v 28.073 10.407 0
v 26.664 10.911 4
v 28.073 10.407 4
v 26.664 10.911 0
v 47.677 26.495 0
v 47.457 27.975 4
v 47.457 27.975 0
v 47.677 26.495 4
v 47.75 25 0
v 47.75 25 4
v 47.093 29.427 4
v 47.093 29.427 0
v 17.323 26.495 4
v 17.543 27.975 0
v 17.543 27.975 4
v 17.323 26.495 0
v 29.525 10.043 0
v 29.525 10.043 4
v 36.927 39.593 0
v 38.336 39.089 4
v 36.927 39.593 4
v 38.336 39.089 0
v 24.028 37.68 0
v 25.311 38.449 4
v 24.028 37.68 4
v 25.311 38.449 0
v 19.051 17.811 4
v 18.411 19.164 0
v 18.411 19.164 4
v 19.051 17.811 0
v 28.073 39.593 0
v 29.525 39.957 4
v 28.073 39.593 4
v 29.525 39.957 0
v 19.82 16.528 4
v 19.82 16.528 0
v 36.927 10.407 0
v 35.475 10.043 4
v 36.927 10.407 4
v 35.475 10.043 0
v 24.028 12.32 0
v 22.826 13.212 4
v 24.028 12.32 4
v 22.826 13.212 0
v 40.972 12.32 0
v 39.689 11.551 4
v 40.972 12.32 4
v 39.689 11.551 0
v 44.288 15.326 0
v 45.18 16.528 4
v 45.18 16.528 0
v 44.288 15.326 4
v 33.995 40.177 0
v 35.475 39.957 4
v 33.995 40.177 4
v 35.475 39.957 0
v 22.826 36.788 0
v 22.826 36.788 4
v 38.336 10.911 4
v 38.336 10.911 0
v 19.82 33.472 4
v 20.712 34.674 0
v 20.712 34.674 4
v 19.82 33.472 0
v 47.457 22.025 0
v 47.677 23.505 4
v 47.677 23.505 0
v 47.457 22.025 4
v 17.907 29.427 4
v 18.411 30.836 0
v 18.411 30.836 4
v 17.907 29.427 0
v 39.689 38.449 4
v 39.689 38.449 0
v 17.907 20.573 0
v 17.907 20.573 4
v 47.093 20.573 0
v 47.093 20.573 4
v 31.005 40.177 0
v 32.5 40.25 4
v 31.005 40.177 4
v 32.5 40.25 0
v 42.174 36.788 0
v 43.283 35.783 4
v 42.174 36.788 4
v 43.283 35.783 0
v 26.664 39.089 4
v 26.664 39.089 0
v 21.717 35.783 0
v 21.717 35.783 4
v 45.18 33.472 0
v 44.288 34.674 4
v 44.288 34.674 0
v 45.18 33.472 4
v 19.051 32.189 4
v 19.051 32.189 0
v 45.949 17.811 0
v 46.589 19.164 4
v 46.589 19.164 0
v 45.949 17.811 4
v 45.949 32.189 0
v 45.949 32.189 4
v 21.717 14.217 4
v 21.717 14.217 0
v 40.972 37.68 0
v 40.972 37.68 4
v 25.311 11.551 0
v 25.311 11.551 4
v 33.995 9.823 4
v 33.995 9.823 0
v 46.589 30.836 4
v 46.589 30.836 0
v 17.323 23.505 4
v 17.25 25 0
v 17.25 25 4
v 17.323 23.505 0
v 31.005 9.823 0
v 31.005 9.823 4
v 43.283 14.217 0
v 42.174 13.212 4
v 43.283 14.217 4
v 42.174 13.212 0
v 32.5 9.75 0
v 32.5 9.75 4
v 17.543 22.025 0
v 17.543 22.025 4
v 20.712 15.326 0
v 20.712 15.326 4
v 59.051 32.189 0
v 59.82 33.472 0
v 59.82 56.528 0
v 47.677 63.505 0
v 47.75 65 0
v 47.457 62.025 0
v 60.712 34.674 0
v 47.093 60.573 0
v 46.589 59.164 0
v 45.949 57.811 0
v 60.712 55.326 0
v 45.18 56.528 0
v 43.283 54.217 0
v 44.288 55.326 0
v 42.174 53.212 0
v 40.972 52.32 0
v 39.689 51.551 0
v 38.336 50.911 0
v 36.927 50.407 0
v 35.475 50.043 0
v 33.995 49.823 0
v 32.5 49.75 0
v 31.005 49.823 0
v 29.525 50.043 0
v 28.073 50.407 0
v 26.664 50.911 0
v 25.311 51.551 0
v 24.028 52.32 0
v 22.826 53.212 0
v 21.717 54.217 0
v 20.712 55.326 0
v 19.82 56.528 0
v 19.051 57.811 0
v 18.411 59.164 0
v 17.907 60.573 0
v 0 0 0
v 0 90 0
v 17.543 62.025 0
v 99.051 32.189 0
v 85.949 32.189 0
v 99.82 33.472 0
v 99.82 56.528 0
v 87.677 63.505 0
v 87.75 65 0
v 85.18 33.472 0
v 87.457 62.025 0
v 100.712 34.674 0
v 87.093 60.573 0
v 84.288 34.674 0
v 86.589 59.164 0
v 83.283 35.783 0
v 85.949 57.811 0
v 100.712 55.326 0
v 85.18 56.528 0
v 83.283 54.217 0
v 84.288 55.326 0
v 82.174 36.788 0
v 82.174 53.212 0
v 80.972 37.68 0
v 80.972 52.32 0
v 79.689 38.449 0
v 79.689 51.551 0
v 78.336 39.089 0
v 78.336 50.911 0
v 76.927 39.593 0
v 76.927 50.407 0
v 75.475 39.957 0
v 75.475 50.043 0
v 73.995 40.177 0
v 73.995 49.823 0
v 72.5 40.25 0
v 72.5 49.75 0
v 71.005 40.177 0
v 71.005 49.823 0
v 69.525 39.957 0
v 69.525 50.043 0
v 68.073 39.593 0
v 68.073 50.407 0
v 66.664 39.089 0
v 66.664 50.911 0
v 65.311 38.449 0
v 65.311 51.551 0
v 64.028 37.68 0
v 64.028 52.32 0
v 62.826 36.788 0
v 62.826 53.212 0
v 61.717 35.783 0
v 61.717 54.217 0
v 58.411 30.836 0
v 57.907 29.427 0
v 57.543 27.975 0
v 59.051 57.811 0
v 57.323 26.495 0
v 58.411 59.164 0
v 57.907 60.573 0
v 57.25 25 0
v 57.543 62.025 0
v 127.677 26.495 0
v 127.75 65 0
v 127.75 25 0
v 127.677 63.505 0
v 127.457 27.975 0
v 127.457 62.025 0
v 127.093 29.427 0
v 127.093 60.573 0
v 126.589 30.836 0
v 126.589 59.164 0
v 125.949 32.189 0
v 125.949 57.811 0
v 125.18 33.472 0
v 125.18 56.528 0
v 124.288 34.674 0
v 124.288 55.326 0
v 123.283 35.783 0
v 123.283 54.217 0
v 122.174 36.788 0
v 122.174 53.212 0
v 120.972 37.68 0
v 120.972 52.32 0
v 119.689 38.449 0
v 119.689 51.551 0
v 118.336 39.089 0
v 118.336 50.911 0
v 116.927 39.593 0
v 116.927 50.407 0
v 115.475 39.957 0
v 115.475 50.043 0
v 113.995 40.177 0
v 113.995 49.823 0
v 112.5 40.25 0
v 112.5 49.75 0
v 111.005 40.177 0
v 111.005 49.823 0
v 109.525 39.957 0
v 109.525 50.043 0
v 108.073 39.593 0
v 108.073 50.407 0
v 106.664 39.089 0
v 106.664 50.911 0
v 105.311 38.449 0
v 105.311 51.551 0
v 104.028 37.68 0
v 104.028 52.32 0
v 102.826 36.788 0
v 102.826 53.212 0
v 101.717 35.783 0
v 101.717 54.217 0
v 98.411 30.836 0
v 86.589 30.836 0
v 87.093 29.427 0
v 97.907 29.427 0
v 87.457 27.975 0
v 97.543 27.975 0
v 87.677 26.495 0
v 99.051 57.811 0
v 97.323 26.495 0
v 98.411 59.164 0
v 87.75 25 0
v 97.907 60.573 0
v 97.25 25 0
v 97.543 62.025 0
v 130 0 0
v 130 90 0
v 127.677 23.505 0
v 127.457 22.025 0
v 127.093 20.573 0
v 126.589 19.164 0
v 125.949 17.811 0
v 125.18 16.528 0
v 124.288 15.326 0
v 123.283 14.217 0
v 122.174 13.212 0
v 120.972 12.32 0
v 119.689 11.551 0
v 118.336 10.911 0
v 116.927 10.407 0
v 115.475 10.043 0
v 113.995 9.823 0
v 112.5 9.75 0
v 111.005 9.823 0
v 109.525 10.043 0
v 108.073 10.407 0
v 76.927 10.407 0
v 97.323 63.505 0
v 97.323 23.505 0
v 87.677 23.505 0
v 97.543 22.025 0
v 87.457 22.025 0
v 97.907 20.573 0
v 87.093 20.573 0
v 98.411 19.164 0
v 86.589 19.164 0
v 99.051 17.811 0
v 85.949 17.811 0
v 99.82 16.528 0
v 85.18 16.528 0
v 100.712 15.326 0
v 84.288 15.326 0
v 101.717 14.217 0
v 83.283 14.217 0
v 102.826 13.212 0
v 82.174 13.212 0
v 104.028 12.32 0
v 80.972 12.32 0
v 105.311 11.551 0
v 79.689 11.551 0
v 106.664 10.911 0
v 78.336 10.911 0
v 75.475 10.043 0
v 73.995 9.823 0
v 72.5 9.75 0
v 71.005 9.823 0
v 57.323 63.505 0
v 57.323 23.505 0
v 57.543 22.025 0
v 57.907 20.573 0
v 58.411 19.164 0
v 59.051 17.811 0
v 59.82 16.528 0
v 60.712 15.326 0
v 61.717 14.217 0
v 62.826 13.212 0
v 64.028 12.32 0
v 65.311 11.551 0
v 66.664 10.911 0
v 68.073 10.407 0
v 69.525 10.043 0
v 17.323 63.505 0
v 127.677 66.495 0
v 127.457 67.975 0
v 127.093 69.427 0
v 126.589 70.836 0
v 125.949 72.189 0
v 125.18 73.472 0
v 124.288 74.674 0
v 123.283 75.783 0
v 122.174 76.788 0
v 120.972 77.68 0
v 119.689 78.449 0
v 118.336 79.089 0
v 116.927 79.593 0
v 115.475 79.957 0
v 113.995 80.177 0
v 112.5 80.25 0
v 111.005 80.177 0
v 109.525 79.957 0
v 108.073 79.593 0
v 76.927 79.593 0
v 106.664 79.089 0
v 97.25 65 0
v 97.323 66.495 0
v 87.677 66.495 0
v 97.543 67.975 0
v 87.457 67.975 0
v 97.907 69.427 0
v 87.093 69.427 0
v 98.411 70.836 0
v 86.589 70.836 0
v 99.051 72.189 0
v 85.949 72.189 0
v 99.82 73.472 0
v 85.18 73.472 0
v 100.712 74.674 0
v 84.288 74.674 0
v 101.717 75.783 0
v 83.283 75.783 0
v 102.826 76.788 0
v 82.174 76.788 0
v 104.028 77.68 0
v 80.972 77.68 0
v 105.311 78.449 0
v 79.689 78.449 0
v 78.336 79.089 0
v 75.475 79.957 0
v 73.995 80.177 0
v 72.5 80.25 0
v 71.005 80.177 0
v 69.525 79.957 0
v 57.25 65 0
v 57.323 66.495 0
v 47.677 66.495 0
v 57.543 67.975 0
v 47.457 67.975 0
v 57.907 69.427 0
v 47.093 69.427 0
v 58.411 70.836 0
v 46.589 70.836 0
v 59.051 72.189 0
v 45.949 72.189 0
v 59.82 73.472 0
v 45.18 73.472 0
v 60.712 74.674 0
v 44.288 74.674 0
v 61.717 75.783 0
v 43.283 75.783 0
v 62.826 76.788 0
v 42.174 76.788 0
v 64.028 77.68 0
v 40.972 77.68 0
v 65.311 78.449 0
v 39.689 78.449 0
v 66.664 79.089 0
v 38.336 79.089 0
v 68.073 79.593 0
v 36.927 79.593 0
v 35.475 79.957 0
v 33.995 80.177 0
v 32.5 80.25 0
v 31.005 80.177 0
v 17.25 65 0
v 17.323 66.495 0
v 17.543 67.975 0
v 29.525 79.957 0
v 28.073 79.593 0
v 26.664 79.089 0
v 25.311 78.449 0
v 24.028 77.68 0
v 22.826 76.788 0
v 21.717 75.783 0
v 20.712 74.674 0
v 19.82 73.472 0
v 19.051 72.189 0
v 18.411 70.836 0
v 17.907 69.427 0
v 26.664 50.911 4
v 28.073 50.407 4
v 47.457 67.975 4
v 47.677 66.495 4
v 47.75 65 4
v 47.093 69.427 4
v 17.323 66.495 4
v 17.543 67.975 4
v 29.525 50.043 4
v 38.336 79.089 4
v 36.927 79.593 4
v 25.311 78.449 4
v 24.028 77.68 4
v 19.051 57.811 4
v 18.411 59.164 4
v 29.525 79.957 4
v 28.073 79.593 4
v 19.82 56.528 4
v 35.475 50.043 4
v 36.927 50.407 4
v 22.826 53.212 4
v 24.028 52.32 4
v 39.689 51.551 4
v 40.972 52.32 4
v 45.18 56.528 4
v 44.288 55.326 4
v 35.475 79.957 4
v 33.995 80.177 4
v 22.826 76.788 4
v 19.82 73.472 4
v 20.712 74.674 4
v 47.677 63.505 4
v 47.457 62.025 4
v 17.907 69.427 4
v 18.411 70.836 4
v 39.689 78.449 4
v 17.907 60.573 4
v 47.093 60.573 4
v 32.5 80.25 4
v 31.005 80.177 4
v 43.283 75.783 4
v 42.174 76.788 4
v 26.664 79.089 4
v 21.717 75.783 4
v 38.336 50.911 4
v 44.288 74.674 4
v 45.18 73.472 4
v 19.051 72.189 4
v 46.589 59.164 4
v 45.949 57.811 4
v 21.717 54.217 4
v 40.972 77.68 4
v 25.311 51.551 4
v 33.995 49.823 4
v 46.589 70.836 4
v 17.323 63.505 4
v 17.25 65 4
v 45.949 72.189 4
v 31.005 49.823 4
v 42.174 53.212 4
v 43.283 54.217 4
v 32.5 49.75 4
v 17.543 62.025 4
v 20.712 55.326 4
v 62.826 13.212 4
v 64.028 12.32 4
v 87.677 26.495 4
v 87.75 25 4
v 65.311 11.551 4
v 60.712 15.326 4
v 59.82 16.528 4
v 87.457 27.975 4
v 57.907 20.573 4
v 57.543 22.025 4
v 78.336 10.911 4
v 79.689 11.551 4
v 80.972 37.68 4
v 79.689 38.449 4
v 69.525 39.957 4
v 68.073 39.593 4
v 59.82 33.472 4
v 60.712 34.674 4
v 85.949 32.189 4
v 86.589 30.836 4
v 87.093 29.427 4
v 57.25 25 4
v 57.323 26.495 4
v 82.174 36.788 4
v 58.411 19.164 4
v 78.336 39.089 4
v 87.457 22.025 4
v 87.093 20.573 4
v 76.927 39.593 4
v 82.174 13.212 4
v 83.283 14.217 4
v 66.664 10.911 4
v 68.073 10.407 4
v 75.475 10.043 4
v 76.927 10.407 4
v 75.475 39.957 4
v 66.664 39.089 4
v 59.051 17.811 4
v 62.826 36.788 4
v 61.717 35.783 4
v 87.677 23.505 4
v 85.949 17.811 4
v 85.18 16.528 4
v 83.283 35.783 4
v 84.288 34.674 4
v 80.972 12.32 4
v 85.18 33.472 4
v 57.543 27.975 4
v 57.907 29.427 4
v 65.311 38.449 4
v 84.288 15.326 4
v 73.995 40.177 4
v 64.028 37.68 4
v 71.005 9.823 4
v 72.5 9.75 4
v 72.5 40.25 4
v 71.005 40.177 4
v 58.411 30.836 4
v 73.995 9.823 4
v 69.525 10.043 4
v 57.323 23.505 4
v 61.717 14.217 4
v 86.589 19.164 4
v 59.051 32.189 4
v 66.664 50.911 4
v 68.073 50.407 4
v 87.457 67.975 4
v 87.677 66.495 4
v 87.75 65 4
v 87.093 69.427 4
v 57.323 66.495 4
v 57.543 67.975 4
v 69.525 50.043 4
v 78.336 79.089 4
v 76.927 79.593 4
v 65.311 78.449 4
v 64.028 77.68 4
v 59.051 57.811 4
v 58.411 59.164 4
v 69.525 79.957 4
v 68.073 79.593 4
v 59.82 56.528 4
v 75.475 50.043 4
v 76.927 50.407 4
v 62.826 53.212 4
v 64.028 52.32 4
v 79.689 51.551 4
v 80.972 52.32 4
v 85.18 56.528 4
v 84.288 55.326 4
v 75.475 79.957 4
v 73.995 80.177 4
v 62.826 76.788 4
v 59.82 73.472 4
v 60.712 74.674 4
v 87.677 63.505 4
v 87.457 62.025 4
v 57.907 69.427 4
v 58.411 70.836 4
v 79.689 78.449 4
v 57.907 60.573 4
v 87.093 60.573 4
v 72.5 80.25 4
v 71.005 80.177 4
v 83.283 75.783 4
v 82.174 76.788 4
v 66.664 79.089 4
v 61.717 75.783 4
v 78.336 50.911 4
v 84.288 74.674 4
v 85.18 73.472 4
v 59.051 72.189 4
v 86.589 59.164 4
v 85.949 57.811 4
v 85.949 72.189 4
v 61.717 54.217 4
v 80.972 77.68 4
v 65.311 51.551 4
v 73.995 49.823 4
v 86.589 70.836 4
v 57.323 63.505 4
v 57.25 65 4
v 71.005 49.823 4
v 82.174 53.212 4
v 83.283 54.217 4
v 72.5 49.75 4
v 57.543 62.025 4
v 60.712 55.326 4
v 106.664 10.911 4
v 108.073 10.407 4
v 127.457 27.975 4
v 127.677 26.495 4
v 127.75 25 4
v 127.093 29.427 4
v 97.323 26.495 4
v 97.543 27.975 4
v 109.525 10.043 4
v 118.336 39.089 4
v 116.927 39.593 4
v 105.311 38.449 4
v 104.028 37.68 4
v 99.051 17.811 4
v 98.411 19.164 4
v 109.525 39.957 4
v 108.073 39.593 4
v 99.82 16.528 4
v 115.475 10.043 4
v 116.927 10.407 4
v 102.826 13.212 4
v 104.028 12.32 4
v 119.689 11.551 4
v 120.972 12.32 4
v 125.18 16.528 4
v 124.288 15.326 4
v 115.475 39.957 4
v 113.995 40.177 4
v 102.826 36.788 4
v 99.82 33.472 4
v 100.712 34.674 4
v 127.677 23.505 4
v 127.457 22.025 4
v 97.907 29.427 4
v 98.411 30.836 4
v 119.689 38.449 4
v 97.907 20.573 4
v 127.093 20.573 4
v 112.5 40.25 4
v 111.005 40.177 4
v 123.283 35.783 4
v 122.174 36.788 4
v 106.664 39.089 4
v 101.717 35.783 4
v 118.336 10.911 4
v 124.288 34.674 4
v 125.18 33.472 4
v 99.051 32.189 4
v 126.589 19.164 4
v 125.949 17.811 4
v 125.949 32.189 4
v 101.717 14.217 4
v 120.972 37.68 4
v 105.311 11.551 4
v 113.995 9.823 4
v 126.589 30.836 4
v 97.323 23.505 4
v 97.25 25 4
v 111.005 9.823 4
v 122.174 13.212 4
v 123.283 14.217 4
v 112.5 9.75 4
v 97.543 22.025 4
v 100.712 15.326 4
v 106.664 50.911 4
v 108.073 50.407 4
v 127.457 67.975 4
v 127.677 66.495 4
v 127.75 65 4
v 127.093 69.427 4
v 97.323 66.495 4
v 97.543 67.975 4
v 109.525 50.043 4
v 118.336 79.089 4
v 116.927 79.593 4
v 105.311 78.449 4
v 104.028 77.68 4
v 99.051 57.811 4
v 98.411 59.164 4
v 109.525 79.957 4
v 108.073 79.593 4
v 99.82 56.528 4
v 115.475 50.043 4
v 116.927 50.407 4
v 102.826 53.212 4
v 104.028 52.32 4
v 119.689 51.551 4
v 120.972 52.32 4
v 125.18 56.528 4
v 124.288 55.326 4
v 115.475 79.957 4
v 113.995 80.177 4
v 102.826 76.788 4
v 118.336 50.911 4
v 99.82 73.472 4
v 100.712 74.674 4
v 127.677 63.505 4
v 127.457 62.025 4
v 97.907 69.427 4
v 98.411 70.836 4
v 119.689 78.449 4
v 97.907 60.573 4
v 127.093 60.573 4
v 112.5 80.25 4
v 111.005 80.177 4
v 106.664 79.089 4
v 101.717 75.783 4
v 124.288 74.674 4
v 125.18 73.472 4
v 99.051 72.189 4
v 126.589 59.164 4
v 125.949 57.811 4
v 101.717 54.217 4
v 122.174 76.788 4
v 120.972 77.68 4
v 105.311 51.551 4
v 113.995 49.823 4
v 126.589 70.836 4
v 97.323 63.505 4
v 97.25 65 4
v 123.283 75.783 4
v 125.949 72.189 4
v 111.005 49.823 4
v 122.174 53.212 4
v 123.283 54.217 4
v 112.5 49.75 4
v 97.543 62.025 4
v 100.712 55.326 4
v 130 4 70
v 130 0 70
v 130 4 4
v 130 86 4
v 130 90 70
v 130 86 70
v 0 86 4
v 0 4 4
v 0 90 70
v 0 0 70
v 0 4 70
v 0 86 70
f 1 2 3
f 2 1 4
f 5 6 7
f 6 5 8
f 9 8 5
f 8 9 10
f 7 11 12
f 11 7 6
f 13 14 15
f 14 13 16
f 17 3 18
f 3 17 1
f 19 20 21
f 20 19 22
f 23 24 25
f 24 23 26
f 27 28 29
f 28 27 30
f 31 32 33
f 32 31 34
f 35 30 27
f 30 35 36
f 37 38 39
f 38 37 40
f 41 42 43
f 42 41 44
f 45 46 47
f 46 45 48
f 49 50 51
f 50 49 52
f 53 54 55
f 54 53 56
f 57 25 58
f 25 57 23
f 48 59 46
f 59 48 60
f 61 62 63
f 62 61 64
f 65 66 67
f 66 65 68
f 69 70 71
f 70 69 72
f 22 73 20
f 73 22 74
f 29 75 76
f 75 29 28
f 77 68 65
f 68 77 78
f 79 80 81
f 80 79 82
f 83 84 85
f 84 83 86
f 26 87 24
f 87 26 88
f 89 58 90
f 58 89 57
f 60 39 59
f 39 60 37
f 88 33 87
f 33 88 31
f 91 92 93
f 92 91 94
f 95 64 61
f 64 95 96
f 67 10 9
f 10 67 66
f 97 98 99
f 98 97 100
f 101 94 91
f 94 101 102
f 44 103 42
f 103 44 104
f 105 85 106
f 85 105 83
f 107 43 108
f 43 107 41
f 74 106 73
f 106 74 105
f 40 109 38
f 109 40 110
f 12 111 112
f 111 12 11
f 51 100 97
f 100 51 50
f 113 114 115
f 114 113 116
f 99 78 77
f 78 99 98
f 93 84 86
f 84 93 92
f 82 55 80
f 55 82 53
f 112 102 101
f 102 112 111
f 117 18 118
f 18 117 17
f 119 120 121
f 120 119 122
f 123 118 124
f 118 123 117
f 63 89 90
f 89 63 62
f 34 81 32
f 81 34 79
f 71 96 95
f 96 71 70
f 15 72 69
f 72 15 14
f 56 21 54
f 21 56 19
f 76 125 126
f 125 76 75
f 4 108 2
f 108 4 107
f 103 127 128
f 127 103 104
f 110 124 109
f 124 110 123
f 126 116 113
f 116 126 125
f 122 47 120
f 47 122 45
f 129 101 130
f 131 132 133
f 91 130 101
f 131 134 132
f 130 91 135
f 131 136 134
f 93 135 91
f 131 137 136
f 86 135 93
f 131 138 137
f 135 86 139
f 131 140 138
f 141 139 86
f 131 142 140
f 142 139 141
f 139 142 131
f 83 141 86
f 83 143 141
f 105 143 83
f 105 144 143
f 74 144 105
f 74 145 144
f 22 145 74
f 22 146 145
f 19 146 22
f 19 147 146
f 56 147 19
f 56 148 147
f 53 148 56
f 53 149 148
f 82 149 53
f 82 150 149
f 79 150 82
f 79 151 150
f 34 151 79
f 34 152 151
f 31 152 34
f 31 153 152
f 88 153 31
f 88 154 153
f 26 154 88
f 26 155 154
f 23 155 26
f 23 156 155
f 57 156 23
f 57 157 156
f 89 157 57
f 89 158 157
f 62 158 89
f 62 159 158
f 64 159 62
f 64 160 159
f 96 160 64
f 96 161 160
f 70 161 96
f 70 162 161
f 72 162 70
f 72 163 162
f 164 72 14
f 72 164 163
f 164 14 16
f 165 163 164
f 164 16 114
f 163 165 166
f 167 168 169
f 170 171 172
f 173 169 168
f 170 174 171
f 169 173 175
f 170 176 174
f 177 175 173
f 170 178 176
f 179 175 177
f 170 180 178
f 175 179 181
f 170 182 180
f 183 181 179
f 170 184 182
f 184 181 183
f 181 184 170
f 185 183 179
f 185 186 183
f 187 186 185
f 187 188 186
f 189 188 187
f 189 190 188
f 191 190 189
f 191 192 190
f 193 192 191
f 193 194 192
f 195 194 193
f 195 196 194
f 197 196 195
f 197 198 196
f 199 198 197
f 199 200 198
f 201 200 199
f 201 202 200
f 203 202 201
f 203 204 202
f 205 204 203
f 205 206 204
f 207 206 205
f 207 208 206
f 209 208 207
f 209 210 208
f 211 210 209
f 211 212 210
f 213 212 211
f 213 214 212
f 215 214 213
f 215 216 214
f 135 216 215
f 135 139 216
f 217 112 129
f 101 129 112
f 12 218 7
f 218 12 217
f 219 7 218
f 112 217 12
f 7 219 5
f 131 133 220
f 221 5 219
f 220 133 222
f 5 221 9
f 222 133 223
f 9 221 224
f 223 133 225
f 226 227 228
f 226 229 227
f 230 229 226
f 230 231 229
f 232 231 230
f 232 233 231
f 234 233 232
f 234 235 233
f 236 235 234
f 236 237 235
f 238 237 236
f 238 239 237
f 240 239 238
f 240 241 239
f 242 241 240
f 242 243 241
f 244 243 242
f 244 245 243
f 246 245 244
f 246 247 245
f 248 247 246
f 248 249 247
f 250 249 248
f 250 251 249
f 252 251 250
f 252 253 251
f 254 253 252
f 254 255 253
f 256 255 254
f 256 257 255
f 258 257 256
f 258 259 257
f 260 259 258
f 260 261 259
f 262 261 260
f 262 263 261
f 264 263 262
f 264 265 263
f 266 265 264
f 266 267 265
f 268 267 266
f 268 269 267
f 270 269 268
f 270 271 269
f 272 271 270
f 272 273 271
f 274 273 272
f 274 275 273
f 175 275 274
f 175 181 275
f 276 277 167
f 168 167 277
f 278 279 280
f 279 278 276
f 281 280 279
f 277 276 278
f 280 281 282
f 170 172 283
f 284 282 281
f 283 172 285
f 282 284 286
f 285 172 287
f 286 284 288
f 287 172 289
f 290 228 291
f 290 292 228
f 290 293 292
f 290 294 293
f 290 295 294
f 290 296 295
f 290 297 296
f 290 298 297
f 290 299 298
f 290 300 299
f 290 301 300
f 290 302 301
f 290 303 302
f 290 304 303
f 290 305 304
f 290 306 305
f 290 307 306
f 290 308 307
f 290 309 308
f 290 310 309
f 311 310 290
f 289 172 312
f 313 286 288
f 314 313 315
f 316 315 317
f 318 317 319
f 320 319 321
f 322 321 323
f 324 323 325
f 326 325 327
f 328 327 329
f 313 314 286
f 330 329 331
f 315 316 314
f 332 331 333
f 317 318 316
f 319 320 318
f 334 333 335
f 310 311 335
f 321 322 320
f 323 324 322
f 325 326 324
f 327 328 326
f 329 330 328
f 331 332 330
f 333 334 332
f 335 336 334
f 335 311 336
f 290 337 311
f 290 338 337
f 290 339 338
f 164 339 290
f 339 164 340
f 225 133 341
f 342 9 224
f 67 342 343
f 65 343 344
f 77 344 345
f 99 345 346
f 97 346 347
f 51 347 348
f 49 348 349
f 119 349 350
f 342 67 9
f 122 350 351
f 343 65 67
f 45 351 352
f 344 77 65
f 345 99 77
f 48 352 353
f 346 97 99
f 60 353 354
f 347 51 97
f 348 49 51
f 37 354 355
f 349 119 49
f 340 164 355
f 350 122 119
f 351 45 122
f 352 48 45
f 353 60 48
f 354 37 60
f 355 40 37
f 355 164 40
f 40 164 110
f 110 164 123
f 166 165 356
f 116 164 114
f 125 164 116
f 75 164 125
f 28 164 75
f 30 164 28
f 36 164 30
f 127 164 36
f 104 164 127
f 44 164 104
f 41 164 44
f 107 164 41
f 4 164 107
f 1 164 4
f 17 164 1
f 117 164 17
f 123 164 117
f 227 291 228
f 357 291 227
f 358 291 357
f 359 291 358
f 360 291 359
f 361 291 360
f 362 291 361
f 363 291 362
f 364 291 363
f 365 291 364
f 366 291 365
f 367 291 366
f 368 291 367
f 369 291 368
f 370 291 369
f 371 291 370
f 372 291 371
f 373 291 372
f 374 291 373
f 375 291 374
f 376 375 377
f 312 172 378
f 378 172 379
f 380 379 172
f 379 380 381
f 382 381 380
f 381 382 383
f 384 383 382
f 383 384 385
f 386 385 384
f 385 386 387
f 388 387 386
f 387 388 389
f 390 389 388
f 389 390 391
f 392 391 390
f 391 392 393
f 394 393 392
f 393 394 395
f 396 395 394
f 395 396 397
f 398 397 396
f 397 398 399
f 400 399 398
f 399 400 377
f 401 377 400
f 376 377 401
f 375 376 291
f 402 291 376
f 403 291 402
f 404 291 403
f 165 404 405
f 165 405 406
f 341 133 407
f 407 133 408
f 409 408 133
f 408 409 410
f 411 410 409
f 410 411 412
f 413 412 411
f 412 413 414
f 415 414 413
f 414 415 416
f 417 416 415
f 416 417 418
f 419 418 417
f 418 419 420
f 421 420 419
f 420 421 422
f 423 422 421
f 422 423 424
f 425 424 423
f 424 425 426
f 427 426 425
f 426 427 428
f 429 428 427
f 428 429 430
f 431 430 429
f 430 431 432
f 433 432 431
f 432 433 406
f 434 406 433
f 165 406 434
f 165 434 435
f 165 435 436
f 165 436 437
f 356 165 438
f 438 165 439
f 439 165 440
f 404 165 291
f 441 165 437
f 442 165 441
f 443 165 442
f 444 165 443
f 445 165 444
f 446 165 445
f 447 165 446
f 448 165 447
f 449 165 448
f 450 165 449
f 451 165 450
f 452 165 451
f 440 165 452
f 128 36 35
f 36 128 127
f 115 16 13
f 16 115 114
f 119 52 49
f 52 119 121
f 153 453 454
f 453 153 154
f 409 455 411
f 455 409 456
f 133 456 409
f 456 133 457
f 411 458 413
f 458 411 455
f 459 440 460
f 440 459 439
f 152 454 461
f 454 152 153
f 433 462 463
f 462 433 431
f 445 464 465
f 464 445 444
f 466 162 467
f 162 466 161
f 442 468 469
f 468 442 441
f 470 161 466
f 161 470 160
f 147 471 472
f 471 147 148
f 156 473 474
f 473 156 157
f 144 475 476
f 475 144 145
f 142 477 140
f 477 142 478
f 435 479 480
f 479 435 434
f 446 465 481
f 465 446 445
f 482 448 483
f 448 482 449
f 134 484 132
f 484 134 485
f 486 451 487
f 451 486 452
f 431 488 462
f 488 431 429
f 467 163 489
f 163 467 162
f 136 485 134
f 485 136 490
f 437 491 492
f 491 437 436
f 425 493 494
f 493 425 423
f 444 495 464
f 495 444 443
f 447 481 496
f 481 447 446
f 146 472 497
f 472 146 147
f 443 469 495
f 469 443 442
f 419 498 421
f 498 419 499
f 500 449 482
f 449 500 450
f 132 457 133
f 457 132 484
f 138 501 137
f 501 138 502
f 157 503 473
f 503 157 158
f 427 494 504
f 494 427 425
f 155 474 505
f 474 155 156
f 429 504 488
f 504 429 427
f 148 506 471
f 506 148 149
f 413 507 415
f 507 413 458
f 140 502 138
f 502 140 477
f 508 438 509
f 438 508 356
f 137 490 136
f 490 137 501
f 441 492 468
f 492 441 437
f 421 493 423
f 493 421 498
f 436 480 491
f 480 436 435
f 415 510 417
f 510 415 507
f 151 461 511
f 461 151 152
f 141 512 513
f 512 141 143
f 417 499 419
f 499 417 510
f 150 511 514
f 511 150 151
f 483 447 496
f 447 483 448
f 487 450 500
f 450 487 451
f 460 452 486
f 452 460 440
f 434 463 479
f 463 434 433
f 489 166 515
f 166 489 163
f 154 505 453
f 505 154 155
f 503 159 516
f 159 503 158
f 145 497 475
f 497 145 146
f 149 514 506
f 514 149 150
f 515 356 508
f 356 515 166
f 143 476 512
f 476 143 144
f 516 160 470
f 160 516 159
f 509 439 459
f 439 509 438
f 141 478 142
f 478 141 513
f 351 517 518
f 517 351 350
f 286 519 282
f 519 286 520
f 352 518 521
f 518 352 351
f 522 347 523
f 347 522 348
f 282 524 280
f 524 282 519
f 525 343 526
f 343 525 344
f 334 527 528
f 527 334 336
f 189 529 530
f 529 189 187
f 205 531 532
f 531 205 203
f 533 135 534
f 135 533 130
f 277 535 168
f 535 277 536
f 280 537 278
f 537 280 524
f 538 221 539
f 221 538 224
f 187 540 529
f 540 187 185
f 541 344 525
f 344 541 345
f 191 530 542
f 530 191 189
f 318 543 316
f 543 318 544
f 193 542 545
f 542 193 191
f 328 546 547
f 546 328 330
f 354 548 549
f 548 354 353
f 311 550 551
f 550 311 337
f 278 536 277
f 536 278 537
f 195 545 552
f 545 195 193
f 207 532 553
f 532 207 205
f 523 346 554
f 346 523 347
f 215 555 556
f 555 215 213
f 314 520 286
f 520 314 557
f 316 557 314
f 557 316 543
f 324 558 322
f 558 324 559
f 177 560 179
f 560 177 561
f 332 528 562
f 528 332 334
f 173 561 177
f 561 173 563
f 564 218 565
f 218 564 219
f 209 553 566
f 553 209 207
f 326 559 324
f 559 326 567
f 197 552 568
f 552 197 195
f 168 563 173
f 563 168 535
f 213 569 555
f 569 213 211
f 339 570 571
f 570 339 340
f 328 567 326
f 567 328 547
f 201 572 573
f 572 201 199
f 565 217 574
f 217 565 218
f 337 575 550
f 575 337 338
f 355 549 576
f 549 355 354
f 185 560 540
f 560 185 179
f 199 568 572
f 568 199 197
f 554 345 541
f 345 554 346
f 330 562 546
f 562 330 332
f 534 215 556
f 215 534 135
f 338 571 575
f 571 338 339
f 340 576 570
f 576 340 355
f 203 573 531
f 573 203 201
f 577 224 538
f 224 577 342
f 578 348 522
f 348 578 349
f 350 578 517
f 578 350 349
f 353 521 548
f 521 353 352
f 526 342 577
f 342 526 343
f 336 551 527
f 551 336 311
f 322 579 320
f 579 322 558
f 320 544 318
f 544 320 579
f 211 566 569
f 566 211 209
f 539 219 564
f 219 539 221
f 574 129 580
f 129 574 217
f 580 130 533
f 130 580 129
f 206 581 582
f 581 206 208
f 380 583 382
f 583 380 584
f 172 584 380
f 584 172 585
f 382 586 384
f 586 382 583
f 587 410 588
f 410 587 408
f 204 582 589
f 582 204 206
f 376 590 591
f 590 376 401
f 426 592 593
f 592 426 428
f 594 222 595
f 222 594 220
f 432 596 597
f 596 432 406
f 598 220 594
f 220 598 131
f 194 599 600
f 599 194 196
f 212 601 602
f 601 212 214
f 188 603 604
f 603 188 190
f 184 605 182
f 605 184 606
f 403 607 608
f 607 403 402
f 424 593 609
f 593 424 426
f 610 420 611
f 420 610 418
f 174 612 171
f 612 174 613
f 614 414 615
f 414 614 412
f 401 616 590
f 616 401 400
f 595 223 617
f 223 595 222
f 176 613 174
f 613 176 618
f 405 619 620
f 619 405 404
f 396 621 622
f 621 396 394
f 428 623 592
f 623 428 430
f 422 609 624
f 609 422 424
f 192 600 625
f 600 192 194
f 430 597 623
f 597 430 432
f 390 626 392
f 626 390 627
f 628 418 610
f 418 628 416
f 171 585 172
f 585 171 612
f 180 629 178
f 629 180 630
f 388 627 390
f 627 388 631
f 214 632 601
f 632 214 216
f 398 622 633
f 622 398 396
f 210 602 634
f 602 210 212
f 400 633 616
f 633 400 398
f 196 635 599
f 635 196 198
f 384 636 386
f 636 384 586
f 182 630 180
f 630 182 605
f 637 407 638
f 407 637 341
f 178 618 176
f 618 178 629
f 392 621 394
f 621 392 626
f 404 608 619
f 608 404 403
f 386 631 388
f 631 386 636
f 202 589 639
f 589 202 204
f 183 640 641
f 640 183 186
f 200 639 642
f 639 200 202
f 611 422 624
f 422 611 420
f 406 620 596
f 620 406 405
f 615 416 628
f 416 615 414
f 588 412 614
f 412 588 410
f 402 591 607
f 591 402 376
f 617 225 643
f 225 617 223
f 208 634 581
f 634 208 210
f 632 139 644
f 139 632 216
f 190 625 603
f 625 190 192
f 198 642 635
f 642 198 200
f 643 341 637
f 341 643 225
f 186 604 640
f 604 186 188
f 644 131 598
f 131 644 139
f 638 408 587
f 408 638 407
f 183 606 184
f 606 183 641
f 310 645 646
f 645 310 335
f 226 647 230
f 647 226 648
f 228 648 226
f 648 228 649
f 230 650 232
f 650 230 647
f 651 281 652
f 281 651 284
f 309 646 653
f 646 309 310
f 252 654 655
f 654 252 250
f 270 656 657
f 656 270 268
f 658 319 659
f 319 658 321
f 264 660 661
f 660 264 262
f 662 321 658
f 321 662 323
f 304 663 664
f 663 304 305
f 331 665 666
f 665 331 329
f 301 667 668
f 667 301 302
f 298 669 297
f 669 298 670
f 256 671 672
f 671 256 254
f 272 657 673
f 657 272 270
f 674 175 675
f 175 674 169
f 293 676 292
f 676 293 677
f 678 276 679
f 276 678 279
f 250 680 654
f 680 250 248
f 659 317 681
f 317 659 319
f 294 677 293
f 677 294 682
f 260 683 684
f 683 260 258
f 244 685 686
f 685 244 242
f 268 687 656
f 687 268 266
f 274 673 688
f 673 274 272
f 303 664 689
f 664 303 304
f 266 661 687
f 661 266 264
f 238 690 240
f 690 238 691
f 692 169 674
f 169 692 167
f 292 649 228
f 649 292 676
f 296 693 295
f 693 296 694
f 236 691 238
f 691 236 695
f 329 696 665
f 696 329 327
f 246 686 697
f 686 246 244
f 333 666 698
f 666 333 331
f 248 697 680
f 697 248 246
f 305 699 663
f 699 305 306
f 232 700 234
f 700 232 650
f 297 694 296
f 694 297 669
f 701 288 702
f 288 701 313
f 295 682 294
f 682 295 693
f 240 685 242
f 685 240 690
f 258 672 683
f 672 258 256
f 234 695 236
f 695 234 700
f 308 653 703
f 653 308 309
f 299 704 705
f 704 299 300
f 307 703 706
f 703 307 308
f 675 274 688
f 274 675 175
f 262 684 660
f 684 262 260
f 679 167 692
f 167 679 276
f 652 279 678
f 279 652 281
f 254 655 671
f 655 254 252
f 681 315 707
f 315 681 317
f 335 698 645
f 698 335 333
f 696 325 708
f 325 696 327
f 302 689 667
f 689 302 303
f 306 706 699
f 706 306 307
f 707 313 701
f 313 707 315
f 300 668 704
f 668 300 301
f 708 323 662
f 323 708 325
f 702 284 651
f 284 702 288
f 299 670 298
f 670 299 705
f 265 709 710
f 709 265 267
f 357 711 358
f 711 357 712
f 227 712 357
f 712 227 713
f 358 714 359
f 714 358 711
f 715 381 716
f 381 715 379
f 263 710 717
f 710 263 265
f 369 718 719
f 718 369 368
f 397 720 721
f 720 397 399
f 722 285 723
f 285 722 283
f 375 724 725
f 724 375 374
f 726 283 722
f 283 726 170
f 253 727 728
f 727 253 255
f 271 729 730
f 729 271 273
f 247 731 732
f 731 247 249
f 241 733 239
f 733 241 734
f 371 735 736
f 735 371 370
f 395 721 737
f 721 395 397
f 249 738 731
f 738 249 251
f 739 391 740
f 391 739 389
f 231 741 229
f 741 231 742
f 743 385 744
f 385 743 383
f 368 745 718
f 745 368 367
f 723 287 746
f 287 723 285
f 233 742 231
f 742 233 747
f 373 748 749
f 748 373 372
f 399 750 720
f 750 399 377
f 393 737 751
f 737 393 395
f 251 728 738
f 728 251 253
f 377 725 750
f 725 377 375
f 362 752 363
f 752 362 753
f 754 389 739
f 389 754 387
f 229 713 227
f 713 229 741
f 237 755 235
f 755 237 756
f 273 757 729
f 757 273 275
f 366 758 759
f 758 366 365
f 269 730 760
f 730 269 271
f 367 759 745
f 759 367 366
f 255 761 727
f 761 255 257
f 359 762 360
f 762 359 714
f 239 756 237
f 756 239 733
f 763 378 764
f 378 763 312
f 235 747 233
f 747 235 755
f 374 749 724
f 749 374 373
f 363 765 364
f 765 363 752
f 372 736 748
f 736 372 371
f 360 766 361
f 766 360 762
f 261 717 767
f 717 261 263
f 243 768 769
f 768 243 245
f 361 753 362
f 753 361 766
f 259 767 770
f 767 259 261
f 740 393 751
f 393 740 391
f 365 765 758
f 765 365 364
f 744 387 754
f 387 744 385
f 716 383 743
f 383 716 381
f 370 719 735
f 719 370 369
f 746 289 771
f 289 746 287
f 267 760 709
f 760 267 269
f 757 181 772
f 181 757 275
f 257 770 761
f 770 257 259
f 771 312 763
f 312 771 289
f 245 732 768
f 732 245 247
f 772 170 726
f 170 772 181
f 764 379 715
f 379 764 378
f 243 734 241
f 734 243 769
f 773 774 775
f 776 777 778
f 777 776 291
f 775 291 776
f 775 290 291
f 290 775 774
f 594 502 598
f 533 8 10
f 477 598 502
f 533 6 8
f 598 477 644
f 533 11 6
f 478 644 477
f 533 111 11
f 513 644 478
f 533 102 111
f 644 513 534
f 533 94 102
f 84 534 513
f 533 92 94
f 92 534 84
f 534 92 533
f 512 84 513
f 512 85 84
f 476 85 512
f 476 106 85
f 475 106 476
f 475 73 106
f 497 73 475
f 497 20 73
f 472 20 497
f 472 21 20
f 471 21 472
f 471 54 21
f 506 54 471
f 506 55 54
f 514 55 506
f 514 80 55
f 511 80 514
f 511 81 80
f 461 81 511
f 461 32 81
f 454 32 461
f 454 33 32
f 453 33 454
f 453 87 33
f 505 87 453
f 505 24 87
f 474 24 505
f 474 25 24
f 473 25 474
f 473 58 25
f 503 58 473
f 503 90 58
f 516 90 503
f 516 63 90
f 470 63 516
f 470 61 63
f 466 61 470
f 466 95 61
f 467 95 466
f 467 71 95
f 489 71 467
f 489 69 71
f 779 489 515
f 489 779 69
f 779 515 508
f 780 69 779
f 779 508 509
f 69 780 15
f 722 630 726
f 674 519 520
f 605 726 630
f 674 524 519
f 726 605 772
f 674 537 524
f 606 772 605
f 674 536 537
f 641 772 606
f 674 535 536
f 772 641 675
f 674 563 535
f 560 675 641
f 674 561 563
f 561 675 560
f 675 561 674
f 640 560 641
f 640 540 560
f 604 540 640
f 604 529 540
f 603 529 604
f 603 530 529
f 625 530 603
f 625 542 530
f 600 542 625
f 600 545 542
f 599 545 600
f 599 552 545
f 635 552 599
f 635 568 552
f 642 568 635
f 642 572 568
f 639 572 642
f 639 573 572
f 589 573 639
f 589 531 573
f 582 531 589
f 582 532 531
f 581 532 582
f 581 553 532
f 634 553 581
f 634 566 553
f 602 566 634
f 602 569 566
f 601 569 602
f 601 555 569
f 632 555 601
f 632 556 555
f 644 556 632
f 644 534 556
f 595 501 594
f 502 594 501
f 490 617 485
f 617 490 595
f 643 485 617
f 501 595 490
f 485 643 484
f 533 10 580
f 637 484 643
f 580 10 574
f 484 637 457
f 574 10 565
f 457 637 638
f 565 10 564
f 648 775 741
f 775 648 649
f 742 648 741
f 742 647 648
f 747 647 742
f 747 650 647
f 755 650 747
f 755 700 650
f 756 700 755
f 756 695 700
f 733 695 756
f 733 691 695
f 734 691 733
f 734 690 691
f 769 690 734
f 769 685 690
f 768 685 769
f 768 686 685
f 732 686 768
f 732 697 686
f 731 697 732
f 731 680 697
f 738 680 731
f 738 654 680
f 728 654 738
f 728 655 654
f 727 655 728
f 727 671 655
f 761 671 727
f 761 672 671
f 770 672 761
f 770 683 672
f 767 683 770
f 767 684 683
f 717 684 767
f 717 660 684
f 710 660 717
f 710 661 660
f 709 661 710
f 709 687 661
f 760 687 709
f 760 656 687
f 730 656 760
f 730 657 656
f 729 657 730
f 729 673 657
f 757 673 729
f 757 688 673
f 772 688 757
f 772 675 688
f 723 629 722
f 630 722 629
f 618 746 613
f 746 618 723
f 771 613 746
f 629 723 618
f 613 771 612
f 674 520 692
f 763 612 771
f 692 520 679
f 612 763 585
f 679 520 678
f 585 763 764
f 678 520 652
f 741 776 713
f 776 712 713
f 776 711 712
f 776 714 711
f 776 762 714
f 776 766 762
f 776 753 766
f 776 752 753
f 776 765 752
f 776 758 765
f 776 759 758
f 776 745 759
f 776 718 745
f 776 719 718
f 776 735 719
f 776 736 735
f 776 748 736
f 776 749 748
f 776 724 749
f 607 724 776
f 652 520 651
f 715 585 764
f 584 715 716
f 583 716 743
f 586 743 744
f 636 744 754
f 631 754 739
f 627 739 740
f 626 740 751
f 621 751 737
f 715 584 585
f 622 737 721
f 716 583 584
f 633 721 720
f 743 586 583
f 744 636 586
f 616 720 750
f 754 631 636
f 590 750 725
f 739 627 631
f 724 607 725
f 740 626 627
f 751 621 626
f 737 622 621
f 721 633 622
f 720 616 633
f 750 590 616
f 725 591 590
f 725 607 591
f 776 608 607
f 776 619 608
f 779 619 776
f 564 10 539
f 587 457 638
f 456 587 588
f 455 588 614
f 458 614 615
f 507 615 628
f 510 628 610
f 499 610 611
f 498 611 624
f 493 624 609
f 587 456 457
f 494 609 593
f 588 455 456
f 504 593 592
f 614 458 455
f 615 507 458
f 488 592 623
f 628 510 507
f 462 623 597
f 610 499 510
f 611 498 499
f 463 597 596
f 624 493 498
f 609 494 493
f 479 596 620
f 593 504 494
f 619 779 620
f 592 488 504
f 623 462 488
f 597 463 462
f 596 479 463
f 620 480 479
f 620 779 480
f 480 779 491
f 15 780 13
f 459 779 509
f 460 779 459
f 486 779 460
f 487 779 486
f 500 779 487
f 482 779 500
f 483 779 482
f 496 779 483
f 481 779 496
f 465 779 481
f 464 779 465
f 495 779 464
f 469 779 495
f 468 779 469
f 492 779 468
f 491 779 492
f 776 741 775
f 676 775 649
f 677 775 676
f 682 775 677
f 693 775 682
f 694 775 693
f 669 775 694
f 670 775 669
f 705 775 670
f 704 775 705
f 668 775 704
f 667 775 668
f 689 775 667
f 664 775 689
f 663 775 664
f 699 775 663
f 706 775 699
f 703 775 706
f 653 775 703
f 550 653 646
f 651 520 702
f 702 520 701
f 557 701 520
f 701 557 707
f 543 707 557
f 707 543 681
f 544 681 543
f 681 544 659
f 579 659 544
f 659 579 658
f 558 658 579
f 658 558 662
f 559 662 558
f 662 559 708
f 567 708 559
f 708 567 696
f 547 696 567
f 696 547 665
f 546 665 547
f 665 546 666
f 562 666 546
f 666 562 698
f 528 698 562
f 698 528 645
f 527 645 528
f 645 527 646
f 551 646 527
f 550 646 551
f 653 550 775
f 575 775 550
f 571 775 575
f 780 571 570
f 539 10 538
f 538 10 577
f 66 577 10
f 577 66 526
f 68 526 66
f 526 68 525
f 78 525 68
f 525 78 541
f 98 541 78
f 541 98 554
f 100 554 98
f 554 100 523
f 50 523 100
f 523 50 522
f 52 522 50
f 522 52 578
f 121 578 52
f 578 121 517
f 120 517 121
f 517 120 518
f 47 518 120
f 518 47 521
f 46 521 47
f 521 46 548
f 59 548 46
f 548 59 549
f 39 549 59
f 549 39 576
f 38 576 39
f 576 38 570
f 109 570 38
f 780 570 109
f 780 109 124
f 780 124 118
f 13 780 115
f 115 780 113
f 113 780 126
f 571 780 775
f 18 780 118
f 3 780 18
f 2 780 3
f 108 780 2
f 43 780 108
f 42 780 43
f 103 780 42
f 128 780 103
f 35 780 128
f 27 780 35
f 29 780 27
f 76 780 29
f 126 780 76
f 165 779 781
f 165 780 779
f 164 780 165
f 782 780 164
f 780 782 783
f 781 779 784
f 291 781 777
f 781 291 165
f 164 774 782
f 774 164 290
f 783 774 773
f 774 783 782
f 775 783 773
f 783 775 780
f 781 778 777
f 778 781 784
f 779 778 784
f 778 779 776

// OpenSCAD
// Dimensions
plate_x = 130;
plate_y = 90;
plate_z = 4;
hole_diameter = 30.5;
hole_radius = hole_diameter / 2;
num_rows = 2; // Along Y
num_cols = 3; // Along X
pitch_x = 40;
pitch_y = 40;
wall_top_z = 70;
wall_thickness = 4;

// Calculate hole positions
// Centred on the plate in X and Y
// X range: 0 to 130. Centres at 130/4 = 32.5, 72.5, 112.5
// Y range: 0 to 90. Centres at 25 and 65 (40mm pitch, centred on 45)

x_positions = [32.5, 72.5, 112.5];
y_positions = [25, 65];

// Wall positions
// Long edges are along X. Walls are at Y=0 and Y=plate_y.
// Wall length is 130 (X). Thickness is 4 (Y).
// Wall 1: X: 0-130, Y: 0-4, Z: 4-70
// Wall 2: X: 0-130, Y: 86-90, Z: 4-70

module rack() {
    // 1. Base Plate
    difference() {
        // Main plate
        cube([plate_x, plate_y, plate_z], center=false);
        
        // Holes
        // Extend hole cutter from z=-1 to z=5 to ensure clean cut through plate
        for (x = x_positions) {
            for (y = y_positions) {
                translate([x, y, 0]) {
                    $fn = 64;
                    cylinder(h=5, d=hole_diameter, center=false);
                }
            }
        }
    }
    
    // 2. Walls
    // Wall 1 (Y=0 side)
    // Height is from plate_z to wall_top_z
    wall_height = wall_top_z - plate_z;
    translate([0, 0, plate_z]) {
        cube([plate_x, wall_thickness, wall_height], center=false);
    }
    
    // Wall 2 (Y=90 side)
    translate([0, plate_y - wall_thickness, plate_z]) {
        cube([plate_x, wall_thickness, wall_height], center=false);
    }
}

rack();
